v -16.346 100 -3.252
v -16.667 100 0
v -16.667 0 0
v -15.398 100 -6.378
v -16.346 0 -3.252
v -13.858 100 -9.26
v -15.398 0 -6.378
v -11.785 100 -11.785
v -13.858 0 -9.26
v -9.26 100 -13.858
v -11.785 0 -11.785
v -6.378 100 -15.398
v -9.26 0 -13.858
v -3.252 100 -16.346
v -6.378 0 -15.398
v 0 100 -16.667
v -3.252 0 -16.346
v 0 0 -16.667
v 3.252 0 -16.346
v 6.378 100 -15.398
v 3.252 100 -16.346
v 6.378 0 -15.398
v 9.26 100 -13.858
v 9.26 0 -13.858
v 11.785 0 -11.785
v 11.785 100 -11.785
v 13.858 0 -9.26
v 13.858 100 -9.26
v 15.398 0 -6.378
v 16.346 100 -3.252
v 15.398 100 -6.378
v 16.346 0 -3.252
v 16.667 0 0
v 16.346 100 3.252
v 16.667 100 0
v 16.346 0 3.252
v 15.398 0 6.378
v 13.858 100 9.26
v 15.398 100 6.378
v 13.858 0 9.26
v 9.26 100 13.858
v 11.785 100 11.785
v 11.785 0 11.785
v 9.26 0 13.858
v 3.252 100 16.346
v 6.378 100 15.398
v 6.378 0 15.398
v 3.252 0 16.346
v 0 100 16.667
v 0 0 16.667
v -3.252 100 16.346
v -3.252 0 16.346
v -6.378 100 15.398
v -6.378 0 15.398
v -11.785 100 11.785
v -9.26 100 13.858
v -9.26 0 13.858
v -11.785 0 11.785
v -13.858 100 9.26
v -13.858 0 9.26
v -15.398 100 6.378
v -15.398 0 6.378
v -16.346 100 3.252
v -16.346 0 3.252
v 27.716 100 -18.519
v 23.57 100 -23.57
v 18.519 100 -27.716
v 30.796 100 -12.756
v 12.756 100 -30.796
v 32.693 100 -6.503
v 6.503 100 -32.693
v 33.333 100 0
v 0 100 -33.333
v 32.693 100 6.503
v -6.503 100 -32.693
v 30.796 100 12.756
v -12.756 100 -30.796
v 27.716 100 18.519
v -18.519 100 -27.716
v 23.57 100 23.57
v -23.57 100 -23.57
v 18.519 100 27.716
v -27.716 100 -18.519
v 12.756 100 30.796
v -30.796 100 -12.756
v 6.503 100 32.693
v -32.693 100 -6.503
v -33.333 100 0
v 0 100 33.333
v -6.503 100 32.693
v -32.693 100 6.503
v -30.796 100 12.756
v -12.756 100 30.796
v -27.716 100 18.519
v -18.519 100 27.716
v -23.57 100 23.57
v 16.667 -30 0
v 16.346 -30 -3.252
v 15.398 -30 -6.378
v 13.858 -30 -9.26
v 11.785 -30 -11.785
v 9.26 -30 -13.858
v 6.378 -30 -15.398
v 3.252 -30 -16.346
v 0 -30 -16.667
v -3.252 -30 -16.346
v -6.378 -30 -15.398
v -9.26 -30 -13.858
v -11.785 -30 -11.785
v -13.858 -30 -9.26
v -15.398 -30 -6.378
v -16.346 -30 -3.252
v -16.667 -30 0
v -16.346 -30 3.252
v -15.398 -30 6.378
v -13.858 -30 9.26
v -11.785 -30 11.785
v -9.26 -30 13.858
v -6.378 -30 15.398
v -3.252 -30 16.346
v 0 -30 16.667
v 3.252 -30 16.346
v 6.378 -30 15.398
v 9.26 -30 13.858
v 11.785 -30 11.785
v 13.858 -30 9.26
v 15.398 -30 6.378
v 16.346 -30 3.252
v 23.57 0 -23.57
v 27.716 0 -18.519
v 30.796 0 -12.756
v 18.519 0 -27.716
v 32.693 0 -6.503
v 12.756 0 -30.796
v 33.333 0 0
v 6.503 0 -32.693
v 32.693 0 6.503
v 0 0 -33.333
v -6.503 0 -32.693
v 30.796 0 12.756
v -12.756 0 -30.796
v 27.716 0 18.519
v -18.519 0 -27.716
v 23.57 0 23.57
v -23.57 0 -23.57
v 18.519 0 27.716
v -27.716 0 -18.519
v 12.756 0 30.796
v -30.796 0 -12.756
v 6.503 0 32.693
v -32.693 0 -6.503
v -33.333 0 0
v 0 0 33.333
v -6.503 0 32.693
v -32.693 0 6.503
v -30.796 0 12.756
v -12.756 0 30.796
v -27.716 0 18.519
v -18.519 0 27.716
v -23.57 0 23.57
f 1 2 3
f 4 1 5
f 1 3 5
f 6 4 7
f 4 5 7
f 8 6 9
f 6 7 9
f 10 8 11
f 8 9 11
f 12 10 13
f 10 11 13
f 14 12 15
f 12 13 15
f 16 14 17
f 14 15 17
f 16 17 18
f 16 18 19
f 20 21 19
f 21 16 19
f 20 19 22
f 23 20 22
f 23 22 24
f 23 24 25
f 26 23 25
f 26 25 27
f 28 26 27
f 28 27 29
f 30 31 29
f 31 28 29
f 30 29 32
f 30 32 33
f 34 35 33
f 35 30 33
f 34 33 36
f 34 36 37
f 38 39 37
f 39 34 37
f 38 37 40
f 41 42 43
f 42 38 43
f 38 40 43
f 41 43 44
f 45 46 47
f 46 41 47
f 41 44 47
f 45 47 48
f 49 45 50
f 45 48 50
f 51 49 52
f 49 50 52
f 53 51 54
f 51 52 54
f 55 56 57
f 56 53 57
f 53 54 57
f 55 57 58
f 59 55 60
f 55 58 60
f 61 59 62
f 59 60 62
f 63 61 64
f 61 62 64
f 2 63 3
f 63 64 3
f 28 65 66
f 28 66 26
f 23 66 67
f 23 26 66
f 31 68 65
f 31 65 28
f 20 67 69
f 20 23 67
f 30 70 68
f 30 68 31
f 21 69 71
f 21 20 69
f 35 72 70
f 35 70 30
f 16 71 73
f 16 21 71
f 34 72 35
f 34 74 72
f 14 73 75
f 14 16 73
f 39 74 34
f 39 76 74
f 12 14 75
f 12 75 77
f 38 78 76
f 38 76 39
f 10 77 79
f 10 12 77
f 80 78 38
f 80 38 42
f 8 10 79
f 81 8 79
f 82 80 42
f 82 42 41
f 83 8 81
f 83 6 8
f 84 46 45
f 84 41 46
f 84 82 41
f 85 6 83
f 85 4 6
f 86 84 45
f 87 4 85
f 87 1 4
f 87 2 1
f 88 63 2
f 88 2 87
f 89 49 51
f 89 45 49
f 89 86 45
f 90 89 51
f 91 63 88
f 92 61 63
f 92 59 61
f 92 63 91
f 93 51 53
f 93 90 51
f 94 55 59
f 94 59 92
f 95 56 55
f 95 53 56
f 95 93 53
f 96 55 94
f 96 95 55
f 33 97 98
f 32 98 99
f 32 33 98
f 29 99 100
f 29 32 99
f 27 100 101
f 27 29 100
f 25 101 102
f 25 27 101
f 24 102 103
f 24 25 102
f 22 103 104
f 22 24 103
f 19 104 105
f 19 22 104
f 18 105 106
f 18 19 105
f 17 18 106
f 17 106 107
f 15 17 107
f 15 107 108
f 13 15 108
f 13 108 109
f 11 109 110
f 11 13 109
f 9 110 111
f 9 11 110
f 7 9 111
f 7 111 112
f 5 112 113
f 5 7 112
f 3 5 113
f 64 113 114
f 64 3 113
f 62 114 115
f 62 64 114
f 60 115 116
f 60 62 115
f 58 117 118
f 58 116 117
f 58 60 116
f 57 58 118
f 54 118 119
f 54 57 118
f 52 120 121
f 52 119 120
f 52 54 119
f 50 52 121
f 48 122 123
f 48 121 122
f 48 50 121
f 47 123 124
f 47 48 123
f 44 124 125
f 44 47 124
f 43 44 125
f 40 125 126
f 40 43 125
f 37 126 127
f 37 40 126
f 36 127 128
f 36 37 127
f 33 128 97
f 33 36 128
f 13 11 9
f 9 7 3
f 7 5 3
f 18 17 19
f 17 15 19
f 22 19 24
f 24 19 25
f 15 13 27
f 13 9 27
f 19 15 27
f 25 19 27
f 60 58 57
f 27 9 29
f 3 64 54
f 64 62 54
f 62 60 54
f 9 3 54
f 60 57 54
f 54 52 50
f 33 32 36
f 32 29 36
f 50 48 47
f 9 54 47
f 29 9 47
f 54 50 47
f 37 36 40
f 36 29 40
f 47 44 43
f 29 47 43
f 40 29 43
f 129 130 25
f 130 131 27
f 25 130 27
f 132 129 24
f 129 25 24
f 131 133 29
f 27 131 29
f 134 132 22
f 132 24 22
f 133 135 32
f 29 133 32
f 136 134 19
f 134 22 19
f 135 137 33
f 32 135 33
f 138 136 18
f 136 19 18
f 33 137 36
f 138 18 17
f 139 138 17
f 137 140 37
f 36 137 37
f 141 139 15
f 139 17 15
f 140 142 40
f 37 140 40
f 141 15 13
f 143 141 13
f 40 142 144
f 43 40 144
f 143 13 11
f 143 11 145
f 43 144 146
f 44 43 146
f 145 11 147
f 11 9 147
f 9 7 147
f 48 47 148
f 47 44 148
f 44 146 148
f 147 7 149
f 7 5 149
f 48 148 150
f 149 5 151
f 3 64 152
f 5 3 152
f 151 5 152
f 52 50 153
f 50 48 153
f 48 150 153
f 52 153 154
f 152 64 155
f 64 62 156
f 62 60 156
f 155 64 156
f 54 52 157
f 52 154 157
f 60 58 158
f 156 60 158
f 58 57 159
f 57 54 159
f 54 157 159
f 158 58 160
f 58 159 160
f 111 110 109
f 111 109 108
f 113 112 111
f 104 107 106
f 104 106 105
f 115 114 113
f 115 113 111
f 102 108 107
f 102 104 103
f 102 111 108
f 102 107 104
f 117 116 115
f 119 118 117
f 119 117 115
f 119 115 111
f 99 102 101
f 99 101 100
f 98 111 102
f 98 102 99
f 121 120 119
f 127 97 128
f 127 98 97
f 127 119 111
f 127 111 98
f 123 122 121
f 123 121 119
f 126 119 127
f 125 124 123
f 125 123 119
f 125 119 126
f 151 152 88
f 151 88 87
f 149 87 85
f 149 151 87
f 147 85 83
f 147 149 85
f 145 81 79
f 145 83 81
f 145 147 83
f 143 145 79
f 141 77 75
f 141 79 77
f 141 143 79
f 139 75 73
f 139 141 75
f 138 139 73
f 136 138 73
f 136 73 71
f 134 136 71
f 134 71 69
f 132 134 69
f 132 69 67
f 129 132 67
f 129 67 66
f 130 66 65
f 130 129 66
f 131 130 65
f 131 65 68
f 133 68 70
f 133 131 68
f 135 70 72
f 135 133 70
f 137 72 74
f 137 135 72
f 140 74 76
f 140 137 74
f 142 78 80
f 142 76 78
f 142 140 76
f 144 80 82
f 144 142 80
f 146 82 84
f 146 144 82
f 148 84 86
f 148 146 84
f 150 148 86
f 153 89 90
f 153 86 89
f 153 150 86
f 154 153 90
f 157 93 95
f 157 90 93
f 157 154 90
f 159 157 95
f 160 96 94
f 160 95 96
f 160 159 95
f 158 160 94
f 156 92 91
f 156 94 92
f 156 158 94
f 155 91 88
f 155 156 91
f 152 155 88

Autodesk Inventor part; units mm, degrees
ref_plane "YZ Plane" through (0, 0, 0) normal (1, 0, 0) x (0, 1, 0)
ref_plane "XZ Plane" through (0, 0, 0) normal (0, 1, 0) x (-1, 0, 0)
ref_plane "XY Plane" through (0, 0, 0) normal (0, 0, 1) x (1, 0, 0)
sketch "Boceto1" plane through (0, 0, 0) normal (0, 1, 0) x (-1, 0, 0)
  circle A0 centre (0, 0) radius 33.3333
  circle A1 centre (0, 0) radius 16.6667
  dimension "d0" = 66.6667
  dimension "d1" = 33.3333
extrude "Extrusión1" add sketch "Boceto1" along normal blind 100
sketch "Boceto2" plane through (0, 0, 0) normal (0, -1, 0) x (1, 0, 0)
  circle A0 centre (0, 0) radius 16.6667 projected
extrude "Extrusión2" add sketch "Boceto2" along normal blind 30
properties part number "Rodillo2"
